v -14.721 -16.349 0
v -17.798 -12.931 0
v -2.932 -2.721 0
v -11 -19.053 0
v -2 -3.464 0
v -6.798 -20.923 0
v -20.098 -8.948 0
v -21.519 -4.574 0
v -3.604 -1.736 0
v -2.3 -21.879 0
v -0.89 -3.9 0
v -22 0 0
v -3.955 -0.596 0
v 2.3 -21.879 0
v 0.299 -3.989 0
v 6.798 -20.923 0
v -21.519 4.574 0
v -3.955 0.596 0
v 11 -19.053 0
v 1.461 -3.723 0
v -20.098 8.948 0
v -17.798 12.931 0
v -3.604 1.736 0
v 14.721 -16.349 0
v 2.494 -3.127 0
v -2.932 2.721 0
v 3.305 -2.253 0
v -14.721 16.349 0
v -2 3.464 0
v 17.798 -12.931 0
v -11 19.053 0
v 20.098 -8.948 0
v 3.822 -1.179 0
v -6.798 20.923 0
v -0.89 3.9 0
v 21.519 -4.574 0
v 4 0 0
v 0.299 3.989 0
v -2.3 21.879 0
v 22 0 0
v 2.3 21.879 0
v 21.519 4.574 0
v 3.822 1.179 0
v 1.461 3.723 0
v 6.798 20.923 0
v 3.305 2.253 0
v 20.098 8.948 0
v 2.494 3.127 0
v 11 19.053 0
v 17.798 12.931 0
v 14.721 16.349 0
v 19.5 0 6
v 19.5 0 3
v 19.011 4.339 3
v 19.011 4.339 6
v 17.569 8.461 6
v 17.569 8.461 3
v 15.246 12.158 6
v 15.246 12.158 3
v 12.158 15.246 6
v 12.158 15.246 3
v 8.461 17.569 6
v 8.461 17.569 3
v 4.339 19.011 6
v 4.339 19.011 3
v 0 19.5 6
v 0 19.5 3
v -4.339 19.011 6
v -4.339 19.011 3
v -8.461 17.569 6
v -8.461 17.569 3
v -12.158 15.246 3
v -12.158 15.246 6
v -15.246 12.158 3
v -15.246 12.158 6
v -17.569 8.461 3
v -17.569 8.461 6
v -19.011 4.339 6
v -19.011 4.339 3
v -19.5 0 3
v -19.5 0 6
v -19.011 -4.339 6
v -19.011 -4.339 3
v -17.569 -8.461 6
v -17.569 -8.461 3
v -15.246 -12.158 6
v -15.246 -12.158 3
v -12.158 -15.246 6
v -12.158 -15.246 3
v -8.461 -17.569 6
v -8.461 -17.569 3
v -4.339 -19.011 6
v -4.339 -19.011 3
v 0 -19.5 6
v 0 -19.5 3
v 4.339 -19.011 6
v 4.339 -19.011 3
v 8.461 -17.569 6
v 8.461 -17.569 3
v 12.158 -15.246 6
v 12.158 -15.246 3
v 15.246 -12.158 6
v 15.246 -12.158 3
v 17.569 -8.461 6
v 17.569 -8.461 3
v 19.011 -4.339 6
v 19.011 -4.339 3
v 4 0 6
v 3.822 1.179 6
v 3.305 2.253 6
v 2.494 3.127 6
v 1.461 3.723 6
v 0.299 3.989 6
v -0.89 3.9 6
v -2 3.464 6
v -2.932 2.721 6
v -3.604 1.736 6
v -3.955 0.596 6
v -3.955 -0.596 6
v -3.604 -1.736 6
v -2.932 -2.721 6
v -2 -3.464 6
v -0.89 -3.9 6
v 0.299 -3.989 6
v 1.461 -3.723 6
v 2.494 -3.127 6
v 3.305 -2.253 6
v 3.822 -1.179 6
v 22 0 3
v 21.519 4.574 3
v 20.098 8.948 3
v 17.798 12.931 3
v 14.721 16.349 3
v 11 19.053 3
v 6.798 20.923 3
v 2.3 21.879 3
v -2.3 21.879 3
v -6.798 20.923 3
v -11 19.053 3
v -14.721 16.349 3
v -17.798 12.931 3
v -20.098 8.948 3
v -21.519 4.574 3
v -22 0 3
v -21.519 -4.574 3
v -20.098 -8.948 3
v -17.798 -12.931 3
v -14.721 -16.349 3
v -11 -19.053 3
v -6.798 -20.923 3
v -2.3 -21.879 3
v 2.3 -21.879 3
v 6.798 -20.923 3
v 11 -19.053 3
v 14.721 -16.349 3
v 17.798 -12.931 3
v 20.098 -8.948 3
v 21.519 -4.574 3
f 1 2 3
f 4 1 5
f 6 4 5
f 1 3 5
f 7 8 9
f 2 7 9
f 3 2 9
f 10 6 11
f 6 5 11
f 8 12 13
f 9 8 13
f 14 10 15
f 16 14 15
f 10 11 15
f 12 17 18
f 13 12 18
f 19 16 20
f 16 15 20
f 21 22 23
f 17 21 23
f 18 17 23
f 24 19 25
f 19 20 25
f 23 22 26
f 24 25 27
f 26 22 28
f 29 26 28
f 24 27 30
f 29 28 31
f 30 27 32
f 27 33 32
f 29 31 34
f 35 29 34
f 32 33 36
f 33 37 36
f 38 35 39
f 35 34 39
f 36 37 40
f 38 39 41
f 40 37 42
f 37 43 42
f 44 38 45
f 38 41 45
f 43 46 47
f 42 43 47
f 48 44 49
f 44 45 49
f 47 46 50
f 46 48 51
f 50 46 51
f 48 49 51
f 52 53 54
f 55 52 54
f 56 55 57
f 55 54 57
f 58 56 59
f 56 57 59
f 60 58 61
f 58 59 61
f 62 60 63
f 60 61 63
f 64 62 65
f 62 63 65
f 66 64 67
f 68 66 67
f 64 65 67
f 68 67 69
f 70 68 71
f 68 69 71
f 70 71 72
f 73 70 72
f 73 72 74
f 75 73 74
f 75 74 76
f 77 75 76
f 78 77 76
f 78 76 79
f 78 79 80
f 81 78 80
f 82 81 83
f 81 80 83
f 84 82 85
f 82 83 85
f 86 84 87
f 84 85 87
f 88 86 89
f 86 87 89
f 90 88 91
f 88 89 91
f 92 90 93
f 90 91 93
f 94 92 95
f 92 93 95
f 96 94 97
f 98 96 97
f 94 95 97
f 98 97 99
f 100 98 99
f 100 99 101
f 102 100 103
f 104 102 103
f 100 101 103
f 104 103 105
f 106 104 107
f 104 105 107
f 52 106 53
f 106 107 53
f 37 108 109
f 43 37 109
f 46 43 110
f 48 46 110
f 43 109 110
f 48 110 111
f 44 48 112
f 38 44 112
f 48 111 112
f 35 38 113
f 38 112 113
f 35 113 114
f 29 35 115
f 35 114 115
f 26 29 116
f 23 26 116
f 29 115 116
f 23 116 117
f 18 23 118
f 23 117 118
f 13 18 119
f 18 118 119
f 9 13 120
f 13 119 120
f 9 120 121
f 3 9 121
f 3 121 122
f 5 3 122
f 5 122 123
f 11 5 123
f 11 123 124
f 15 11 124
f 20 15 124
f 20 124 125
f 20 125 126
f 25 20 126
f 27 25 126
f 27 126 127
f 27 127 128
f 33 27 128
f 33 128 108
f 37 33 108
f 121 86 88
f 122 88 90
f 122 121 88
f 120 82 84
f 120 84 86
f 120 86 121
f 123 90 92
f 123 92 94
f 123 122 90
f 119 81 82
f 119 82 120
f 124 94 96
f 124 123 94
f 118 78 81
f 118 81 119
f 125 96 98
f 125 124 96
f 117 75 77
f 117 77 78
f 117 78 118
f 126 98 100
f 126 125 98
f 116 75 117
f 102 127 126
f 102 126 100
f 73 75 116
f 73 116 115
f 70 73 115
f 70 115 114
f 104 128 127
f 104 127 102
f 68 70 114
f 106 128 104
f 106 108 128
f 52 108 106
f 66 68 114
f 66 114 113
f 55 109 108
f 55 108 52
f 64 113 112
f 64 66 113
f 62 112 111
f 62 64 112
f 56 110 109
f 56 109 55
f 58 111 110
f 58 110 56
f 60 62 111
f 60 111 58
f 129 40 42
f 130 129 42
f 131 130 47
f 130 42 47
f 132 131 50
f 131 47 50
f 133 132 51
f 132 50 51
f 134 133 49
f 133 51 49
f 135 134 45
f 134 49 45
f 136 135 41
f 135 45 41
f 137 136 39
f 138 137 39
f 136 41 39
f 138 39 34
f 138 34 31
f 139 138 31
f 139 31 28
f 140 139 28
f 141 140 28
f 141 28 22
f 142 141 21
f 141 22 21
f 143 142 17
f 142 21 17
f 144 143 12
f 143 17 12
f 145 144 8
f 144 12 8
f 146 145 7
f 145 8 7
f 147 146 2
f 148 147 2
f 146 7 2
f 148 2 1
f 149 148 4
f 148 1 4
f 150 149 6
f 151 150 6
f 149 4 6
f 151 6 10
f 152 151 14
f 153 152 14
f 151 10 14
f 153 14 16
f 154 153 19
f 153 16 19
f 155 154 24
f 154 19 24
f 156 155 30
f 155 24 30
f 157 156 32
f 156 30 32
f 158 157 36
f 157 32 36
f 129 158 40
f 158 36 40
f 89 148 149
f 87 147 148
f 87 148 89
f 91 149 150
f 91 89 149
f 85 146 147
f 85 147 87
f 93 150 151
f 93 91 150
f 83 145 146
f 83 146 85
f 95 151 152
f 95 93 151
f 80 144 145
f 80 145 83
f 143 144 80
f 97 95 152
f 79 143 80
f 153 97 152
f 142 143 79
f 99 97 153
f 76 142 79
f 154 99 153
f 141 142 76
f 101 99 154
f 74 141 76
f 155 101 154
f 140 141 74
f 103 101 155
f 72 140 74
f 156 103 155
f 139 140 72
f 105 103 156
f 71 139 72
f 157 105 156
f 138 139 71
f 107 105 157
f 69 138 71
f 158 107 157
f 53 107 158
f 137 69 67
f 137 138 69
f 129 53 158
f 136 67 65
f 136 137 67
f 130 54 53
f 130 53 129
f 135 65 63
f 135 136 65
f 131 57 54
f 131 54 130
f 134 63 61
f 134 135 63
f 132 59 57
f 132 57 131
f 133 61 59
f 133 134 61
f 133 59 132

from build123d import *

# Parameters (mm, degrees)
F0_R     = 22
F1_DEPTH = 3
F2_R     = 19.5
F3_DEPTH = 3
F4_R     = 4
F5_DEPTH = 6.001


with BuildPart() as f1:
    # F0 (on Top) → F1 (new body)
    with BuildSketch(Plane.XY):
        Circle(F0_R)
    extrude(amount=F1_DEPTH)

    # F2 (on face) → F3 (join)
    with BuildSketch(Plane.XY.offset(3)):
        Circle(F2_R)
    extrude(amount=F3_DEPTH)

    # F4 (on face) → F5 (cut, through all)
    with BuildSketch(Plane.XY.offset(6)):
        Circle(F4_R)
    extrude(amount=-F5_DEPTH, mode=Mode.SUBTRACT)


solid = f1.part
